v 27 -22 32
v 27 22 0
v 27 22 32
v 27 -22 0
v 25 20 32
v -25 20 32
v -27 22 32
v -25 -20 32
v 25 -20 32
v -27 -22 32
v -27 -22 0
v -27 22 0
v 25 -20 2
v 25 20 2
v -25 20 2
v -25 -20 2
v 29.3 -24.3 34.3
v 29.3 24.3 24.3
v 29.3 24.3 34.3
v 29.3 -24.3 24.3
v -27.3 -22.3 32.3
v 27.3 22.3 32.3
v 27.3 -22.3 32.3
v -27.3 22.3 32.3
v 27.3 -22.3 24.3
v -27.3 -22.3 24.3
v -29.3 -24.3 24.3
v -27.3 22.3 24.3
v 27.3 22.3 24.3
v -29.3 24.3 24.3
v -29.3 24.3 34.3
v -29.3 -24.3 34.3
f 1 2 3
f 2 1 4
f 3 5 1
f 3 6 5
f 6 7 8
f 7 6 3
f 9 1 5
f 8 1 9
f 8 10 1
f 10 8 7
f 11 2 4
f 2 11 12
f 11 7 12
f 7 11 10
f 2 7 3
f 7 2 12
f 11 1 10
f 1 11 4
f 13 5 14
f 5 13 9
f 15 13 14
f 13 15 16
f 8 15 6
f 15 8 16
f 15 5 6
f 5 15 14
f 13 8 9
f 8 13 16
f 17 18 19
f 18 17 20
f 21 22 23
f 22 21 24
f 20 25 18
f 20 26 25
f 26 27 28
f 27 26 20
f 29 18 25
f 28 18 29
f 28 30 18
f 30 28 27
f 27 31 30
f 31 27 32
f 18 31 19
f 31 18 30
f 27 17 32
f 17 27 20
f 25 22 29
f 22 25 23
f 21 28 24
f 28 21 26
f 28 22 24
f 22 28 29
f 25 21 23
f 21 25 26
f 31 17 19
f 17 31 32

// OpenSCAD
// Units: mm

wall = 2.0;
clearance = 0.30;

cavity_x = 50;
cavity_y = 40;
cavity_z = 30;

base_inner_x = cavity_x;
base_inner_y = cavity_y;
base_inner_z = cavity_z;

base_outer_x = base_inner_x + 2 * wall;
base_outer_y = base_inner_y + 2 * wall;
base_outer_z = base_inner_z + wall;

lid_top_thickness = wall;
lid_skirt_depth = 8;
lid_gap_z = clearance;

lid_inner_x = base_outer_x + 2 * clearance;
lid_inner_y = base_outer_y + 2 * clearance;
lid_outer_x = lid_inner_x + 2 * wall;
lid_outer_y = lid_inner_y + 2 * wall;

module base() {
    difference() {
        translate([-base_outer_x / 2, -base_outer_y / 2, 0])
            cube([base_outer_x, base_outer_y, base_outer_z]);

        translate([-base_inner_x / 2, -base_inner_y / 2, wall])
            cube([base_inner_x, base_inner_y, base_inner_z + 0.2]);
    }
}

module lid() {
    union() {
        translate([-lid_outer_x / 2, -lid_outer_y / 2, base_outer_z + lid_gap_z])
            cube([lid_outer_x, lid_outer_y, lid_top_thickness]);

        difference() {
            translate([
                -lid_outer_x / 2,
                -lid_outer_y / 2,
                base_outer_z + lid_gap_z - lid_skirt_depth
            ])
                cube([lid_outer_x, lid_outer_y, lid_skirt_depth]);

            translate([
                -lid_inner_x / 2,
                -lid_inner_y / 2,
                base_outer_z + lid_gap_z - lid_skirt_depth - 0.1
            ])
                cube([lid_inner_x, lid_inner_y, lid_skirt_depth + 0.2]);
        }
    }
}

base();
lid();
